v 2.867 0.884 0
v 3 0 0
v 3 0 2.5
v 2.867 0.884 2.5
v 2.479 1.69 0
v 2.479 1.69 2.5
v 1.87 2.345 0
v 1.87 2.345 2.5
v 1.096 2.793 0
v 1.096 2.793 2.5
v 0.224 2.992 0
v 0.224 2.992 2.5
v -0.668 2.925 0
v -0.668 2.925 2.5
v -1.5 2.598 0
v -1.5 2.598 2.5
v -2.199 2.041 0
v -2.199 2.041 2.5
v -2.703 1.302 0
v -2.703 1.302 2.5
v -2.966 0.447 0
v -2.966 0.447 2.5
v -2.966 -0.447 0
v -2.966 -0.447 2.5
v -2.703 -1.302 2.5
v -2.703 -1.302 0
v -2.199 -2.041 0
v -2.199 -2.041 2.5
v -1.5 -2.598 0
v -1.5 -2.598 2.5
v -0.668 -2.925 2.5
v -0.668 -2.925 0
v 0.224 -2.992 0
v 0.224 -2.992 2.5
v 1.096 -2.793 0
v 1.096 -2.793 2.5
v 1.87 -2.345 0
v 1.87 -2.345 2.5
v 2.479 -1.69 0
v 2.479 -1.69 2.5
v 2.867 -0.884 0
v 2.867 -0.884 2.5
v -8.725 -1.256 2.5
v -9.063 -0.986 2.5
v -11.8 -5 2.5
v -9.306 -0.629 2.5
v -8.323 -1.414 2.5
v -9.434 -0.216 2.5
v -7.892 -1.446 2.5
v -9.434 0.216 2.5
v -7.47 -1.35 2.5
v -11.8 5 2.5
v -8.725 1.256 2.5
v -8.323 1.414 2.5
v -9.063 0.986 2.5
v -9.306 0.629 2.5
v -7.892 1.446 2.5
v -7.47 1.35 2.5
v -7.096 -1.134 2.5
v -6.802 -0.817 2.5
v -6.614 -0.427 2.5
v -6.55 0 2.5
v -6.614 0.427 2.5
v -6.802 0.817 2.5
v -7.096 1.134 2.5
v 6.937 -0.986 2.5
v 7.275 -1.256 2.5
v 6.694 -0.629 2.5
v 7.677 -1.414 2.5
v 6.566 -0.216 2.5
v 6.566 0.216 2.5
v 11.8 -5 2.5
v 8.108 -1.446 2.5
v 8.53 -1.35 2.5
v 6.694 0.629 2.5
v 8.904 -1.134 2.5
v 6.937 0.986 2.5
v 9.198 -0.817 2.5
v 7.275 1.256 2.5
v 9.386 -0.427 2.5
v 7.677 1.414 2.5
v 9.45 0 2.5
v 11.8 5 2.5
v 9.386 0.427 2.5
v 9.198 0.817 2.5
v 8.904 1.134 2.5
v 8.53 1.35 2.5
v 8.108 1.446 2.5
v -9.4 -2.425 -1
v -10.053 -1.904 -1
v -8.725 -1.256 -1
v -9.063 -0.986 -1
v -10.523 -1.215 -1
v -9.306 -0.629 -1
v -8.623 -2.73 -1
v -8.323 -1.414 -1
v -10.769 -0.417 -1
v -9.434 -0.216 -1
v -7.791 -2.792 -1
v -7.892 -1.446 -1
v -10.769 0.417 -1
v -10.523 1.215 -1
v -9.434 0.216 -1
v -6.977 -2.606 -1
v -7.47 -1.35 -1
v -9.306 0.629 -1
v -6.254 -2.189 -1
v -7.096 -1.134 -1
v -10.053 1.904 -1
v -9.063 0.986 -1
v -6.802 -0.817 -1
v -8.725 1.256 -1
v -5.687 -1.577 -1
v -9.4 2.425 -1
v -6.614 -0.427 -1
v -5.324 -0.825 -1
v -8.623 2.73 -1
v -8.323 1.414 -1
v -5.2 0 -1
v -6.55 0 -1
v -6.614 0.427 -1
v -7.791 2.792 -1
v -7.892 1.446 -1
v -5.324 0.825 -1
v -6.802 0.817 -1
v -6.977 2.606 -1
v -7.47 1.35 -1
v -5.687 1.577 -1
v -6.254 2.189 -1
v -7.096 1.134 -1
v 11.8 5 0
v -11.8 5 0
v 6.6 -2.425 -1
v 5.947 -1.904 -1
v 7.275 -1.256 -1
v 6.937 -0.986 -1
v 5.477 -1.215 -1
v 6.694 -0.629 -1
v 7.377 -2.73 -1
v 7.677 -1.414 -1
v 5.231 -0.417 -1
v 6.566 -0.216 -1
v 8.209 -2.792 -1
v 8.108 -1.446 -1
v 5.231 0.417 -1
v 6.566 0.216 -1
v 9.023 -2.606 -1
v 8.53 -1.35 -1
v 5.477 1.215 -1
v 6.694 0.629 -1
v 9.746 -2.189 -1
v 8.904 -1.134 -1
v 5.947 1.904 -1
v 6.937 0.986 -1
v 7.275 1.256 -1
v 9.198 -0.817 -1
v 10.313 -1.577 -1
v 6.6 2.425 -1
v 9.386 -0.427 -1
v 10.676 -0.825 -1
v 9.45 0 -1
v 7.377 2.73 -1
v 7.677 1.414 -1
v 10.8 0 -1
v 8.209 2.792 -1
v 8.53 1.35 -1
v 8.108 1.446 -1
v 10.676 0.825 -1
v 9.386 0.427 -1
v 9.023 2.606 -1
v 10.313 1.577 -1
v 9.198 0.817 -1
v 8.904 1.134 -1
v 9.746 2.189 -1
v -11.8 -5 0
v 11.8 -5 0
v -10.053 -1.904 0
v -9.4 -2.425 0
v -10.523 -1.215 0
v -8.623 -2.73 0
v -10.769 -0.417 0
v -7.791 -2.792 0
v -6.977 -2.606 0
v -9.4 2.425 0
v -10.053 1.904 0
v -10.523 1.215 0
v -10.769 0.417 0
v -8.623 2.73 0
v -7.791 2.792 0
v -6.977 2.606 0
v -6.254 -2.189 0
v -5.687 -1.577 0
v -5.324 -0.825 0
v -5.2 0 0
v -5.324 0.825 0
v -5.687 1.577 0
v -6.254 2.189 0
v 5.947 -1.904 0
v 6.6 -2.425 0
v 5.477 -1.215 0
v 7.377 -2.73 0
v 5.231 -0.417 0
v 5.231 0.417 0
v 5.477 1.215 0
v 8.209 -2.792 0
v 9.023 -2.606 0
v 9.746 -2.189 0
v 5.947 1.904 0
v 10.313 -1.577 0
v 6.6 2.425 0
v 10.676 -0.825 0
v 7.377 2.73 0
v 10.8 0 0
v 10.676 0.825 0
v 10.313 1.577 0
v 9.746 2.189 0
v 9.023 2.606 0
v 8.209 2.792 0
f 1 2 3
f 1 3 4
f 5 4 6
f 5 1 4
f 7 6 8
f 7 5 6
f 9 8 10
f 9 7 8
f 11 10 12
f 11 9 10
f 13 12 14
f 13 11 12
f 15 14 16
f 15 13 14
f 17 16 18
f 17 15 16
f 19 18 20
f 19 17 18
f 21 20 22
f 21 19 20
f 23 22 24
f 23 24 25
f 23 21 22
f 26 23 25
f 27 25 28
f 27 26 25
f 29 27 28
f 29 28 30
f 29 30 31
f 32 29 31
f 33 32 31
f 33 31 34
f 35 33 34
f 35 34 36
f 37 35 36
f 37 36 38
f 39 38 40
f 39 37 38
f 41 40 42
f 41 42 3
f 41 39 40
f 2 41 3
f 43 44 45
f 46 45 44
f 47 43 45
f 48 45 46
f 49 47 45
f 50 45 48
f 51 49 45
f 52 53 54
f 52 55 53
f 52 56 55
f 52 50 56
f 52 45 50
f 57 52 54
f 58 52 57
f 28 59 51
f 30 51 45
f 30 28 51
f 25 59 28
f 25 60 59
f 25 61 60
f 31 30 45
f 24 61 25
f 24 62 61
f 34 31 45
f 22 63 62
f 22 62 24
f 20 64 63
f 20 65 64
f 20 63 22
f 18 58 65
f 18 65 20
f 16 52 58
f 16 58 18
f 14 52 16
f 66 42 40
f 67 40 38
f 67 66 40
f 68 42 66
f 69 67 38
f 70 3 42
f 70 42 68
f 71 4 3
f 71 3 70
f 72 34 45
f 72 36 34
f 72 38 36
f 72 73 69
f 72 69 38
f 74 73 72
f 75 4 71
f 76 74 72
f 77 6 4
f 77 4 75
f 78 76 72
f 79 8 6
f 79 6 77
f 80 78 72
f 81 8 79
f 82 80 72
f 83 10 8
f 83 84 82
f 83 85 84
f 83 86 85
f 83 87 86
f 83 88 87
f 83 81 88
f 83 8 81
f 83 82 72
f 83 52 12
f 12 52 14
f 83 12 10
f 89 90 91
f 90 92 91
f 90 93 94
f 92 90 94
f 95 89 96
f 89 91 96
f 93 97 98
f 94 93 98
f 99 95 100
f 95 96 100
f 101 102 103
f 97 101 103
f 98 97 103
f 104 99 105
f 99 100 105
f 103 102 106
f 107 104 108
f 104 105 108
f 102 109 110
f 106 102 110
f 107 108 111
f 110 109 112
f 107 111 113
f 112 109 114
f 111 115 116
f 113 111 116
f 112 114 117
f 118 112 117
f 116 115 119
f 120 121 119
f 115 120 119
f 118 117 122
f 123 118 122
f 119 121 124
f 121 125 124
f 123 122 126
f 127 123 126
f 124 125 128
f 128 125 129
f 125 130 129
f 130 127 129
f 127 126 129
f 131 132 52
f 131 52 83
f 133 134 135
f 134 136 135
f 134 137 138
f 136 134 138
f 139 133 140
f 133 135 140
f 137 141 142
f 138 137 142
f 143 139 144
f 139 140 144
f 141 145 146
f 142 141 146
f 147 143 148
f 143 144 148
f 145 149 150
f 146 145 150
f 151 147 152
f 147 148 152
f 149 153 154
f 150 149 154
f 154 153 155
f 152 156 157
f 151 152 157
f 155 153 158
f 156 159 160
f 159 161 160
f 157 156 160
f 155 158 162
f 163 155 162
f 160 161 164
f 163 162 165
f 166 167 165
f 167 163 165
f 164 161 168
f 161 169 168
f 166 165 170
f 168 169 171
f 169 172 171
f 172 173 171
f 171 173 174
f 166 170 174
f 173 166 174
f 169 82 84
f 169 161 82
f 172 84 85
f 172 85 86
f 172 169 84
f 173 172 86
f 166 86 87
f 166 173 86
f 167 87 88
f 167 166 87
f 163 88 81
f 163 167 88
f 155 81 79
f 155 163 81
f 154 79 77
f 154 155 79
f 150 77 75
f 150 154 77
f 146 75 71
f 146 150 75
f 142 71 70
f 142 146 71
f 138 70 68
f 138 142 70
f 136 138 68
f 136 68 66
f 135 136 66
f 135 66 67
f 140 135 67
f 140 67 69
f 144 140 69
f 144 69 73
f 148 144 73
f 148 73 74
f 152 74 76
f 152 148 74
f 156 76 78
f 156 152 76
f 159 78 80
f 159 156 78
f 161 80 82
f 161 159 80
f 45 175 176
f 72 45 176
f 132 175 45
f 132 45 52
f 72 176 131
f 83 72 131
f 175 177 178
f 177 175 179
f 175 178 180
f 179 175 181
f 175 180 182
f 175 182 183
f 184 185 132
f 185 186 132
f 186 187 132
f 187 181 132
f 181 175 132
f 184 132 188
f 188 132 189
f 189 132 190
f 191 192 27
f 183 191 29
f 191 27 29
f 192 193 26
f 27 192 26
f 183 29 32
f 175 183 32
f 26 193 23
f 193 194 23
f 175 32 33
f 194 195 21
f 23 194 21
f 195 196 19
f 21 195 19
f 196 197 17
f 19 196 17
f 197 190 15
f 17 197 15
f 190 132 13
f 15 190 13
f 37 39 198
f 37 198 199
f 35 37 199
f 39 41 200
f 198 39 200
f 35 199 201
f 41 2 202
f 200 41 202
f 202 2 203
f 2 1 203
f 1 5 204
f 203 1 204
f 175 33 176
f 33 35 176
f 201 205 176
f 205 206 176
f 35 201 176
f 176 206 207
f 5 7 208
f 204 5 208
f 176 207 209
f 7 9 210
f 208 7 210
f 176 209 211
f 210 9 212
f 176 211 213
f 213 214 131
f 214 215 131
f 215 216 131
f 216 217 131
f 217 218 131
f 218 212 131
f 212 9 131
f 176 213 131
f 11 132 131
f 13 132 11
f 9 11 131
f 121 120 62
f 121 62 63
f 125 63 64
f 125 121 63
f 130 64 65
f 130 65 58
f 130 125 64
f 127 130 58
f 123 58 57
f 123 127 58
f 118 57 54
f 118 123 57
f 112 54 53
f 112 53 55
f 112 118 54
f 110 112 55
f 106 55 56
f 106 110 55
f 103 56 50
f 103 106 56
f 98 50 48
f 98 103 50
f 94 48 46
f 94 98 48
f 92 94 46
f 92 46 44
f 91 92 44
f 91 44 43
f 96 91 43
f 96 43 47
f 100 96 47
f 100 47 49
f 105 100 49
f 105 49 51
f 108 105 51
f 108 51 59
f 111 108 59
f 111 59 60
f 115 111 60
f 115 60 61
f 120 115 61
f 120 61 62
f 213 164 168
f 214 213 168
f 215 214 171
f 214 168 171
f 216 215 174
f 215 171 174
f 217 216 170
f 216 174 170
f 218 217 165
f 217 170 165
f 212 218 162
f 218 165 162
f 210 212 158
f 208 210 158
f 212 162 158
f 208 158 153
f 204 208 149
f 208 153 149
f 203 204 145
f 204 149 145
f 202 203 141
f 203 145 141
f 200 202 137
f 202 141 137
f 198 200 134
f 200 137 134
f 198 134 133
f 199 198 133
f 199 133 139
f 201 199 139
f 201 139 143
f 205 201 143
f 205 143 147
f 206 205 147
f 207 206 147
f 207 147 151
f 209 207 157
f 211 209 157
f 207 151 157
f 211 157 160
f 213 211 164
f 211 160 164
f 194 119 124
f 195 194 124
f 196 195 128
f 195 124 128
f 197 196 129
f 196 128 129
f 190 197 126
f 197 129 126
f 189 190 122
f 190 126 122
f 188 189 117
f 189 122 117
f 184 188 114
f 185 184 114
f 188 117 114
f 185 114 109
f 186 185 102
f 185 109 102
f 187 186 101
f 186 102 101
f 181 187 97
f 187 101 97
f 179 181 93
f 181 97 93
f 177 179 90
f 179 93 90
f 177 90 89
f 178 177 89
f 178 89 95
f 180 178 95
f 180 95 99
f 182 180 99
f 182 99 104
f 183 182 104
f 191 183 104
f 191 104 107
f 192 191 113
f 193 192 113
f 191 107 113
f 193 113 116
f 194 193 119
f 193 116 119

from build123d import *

# Parameters (mm, degrees)
SKETCH_1_W                             = 23.6
SKETCH_1_H                             = 10
SKETCH_1_R                             = 1.45
SKETCH_1_R_2                           = 3
PLATE_23_6X10_T2_5_M2_5_D2_9_P16_DEPTH = 2.5
UNIT_RECESS_RINGS_OD5_6_ID2_9_H1_START = -1
SKETCH_2_R                             = 2.8
SKETCH_2_R_2                           = 1.45
UNIT_RECESS_RINGS_OD5_6_ID2_9_H1_DEPTH = 1


with BuildPart() as part:
    # 草图1 → Plate_23.6x10_T2.5_M2.5_D2.9_P16 (new body)
    with BuildSketch(Plane.XY):
        Rectangle(SKETCH_1_W, SKETCH_1_H)
        with Locations((-8, 0)):
            Circle(SKETCH_1_R, mode=Mode.SUBTRACT)
        with Locations((8, 0)):
            Circle(SKETCH_1_R, mode=Mode.SUBTRACT)
        Circle(SKETCH_1_R_2, mode=Mode.SUBTRACT)
    extrude(amount=PLATE_23_6X10_T2_5_M2_5_D2_9_P16_DEPTH)

    # 草图2 → Unit_recess_rings_OD5.6_ID2.9_H1 (add)
    # profile 1 of 2: a face of its own
    with BuildSketch(Plane.XY.offset(UNIT_RECESS_RINGS_OD5_6_ID2_9_H1_START)):
        with Locations((-8, 0)):
            Circle(SKETCH_2_R)
        with Locations((-8, 0)):
            Circle(SKETCH_2_R_2, mode=Mode.SUBTRACT)
    # profile 2 of 2: a face of its own
    with BuildSketch(Plane.XY.offset(UNIT_RECESS_RINGS_OD5_6_ID2_9_H1_START)):
        with Locations((8, 0)):
            Circle(SKETCH_2_R)
        with Locations((8, 0)):
            Circle(SKETCH_2_R_2, mode=Mode.SUBTRACT)
    extrude(amount=UNIT_RECESS_RINGS_OD5_6_ID2_9_H1_DEPTH)


solid = part.part
